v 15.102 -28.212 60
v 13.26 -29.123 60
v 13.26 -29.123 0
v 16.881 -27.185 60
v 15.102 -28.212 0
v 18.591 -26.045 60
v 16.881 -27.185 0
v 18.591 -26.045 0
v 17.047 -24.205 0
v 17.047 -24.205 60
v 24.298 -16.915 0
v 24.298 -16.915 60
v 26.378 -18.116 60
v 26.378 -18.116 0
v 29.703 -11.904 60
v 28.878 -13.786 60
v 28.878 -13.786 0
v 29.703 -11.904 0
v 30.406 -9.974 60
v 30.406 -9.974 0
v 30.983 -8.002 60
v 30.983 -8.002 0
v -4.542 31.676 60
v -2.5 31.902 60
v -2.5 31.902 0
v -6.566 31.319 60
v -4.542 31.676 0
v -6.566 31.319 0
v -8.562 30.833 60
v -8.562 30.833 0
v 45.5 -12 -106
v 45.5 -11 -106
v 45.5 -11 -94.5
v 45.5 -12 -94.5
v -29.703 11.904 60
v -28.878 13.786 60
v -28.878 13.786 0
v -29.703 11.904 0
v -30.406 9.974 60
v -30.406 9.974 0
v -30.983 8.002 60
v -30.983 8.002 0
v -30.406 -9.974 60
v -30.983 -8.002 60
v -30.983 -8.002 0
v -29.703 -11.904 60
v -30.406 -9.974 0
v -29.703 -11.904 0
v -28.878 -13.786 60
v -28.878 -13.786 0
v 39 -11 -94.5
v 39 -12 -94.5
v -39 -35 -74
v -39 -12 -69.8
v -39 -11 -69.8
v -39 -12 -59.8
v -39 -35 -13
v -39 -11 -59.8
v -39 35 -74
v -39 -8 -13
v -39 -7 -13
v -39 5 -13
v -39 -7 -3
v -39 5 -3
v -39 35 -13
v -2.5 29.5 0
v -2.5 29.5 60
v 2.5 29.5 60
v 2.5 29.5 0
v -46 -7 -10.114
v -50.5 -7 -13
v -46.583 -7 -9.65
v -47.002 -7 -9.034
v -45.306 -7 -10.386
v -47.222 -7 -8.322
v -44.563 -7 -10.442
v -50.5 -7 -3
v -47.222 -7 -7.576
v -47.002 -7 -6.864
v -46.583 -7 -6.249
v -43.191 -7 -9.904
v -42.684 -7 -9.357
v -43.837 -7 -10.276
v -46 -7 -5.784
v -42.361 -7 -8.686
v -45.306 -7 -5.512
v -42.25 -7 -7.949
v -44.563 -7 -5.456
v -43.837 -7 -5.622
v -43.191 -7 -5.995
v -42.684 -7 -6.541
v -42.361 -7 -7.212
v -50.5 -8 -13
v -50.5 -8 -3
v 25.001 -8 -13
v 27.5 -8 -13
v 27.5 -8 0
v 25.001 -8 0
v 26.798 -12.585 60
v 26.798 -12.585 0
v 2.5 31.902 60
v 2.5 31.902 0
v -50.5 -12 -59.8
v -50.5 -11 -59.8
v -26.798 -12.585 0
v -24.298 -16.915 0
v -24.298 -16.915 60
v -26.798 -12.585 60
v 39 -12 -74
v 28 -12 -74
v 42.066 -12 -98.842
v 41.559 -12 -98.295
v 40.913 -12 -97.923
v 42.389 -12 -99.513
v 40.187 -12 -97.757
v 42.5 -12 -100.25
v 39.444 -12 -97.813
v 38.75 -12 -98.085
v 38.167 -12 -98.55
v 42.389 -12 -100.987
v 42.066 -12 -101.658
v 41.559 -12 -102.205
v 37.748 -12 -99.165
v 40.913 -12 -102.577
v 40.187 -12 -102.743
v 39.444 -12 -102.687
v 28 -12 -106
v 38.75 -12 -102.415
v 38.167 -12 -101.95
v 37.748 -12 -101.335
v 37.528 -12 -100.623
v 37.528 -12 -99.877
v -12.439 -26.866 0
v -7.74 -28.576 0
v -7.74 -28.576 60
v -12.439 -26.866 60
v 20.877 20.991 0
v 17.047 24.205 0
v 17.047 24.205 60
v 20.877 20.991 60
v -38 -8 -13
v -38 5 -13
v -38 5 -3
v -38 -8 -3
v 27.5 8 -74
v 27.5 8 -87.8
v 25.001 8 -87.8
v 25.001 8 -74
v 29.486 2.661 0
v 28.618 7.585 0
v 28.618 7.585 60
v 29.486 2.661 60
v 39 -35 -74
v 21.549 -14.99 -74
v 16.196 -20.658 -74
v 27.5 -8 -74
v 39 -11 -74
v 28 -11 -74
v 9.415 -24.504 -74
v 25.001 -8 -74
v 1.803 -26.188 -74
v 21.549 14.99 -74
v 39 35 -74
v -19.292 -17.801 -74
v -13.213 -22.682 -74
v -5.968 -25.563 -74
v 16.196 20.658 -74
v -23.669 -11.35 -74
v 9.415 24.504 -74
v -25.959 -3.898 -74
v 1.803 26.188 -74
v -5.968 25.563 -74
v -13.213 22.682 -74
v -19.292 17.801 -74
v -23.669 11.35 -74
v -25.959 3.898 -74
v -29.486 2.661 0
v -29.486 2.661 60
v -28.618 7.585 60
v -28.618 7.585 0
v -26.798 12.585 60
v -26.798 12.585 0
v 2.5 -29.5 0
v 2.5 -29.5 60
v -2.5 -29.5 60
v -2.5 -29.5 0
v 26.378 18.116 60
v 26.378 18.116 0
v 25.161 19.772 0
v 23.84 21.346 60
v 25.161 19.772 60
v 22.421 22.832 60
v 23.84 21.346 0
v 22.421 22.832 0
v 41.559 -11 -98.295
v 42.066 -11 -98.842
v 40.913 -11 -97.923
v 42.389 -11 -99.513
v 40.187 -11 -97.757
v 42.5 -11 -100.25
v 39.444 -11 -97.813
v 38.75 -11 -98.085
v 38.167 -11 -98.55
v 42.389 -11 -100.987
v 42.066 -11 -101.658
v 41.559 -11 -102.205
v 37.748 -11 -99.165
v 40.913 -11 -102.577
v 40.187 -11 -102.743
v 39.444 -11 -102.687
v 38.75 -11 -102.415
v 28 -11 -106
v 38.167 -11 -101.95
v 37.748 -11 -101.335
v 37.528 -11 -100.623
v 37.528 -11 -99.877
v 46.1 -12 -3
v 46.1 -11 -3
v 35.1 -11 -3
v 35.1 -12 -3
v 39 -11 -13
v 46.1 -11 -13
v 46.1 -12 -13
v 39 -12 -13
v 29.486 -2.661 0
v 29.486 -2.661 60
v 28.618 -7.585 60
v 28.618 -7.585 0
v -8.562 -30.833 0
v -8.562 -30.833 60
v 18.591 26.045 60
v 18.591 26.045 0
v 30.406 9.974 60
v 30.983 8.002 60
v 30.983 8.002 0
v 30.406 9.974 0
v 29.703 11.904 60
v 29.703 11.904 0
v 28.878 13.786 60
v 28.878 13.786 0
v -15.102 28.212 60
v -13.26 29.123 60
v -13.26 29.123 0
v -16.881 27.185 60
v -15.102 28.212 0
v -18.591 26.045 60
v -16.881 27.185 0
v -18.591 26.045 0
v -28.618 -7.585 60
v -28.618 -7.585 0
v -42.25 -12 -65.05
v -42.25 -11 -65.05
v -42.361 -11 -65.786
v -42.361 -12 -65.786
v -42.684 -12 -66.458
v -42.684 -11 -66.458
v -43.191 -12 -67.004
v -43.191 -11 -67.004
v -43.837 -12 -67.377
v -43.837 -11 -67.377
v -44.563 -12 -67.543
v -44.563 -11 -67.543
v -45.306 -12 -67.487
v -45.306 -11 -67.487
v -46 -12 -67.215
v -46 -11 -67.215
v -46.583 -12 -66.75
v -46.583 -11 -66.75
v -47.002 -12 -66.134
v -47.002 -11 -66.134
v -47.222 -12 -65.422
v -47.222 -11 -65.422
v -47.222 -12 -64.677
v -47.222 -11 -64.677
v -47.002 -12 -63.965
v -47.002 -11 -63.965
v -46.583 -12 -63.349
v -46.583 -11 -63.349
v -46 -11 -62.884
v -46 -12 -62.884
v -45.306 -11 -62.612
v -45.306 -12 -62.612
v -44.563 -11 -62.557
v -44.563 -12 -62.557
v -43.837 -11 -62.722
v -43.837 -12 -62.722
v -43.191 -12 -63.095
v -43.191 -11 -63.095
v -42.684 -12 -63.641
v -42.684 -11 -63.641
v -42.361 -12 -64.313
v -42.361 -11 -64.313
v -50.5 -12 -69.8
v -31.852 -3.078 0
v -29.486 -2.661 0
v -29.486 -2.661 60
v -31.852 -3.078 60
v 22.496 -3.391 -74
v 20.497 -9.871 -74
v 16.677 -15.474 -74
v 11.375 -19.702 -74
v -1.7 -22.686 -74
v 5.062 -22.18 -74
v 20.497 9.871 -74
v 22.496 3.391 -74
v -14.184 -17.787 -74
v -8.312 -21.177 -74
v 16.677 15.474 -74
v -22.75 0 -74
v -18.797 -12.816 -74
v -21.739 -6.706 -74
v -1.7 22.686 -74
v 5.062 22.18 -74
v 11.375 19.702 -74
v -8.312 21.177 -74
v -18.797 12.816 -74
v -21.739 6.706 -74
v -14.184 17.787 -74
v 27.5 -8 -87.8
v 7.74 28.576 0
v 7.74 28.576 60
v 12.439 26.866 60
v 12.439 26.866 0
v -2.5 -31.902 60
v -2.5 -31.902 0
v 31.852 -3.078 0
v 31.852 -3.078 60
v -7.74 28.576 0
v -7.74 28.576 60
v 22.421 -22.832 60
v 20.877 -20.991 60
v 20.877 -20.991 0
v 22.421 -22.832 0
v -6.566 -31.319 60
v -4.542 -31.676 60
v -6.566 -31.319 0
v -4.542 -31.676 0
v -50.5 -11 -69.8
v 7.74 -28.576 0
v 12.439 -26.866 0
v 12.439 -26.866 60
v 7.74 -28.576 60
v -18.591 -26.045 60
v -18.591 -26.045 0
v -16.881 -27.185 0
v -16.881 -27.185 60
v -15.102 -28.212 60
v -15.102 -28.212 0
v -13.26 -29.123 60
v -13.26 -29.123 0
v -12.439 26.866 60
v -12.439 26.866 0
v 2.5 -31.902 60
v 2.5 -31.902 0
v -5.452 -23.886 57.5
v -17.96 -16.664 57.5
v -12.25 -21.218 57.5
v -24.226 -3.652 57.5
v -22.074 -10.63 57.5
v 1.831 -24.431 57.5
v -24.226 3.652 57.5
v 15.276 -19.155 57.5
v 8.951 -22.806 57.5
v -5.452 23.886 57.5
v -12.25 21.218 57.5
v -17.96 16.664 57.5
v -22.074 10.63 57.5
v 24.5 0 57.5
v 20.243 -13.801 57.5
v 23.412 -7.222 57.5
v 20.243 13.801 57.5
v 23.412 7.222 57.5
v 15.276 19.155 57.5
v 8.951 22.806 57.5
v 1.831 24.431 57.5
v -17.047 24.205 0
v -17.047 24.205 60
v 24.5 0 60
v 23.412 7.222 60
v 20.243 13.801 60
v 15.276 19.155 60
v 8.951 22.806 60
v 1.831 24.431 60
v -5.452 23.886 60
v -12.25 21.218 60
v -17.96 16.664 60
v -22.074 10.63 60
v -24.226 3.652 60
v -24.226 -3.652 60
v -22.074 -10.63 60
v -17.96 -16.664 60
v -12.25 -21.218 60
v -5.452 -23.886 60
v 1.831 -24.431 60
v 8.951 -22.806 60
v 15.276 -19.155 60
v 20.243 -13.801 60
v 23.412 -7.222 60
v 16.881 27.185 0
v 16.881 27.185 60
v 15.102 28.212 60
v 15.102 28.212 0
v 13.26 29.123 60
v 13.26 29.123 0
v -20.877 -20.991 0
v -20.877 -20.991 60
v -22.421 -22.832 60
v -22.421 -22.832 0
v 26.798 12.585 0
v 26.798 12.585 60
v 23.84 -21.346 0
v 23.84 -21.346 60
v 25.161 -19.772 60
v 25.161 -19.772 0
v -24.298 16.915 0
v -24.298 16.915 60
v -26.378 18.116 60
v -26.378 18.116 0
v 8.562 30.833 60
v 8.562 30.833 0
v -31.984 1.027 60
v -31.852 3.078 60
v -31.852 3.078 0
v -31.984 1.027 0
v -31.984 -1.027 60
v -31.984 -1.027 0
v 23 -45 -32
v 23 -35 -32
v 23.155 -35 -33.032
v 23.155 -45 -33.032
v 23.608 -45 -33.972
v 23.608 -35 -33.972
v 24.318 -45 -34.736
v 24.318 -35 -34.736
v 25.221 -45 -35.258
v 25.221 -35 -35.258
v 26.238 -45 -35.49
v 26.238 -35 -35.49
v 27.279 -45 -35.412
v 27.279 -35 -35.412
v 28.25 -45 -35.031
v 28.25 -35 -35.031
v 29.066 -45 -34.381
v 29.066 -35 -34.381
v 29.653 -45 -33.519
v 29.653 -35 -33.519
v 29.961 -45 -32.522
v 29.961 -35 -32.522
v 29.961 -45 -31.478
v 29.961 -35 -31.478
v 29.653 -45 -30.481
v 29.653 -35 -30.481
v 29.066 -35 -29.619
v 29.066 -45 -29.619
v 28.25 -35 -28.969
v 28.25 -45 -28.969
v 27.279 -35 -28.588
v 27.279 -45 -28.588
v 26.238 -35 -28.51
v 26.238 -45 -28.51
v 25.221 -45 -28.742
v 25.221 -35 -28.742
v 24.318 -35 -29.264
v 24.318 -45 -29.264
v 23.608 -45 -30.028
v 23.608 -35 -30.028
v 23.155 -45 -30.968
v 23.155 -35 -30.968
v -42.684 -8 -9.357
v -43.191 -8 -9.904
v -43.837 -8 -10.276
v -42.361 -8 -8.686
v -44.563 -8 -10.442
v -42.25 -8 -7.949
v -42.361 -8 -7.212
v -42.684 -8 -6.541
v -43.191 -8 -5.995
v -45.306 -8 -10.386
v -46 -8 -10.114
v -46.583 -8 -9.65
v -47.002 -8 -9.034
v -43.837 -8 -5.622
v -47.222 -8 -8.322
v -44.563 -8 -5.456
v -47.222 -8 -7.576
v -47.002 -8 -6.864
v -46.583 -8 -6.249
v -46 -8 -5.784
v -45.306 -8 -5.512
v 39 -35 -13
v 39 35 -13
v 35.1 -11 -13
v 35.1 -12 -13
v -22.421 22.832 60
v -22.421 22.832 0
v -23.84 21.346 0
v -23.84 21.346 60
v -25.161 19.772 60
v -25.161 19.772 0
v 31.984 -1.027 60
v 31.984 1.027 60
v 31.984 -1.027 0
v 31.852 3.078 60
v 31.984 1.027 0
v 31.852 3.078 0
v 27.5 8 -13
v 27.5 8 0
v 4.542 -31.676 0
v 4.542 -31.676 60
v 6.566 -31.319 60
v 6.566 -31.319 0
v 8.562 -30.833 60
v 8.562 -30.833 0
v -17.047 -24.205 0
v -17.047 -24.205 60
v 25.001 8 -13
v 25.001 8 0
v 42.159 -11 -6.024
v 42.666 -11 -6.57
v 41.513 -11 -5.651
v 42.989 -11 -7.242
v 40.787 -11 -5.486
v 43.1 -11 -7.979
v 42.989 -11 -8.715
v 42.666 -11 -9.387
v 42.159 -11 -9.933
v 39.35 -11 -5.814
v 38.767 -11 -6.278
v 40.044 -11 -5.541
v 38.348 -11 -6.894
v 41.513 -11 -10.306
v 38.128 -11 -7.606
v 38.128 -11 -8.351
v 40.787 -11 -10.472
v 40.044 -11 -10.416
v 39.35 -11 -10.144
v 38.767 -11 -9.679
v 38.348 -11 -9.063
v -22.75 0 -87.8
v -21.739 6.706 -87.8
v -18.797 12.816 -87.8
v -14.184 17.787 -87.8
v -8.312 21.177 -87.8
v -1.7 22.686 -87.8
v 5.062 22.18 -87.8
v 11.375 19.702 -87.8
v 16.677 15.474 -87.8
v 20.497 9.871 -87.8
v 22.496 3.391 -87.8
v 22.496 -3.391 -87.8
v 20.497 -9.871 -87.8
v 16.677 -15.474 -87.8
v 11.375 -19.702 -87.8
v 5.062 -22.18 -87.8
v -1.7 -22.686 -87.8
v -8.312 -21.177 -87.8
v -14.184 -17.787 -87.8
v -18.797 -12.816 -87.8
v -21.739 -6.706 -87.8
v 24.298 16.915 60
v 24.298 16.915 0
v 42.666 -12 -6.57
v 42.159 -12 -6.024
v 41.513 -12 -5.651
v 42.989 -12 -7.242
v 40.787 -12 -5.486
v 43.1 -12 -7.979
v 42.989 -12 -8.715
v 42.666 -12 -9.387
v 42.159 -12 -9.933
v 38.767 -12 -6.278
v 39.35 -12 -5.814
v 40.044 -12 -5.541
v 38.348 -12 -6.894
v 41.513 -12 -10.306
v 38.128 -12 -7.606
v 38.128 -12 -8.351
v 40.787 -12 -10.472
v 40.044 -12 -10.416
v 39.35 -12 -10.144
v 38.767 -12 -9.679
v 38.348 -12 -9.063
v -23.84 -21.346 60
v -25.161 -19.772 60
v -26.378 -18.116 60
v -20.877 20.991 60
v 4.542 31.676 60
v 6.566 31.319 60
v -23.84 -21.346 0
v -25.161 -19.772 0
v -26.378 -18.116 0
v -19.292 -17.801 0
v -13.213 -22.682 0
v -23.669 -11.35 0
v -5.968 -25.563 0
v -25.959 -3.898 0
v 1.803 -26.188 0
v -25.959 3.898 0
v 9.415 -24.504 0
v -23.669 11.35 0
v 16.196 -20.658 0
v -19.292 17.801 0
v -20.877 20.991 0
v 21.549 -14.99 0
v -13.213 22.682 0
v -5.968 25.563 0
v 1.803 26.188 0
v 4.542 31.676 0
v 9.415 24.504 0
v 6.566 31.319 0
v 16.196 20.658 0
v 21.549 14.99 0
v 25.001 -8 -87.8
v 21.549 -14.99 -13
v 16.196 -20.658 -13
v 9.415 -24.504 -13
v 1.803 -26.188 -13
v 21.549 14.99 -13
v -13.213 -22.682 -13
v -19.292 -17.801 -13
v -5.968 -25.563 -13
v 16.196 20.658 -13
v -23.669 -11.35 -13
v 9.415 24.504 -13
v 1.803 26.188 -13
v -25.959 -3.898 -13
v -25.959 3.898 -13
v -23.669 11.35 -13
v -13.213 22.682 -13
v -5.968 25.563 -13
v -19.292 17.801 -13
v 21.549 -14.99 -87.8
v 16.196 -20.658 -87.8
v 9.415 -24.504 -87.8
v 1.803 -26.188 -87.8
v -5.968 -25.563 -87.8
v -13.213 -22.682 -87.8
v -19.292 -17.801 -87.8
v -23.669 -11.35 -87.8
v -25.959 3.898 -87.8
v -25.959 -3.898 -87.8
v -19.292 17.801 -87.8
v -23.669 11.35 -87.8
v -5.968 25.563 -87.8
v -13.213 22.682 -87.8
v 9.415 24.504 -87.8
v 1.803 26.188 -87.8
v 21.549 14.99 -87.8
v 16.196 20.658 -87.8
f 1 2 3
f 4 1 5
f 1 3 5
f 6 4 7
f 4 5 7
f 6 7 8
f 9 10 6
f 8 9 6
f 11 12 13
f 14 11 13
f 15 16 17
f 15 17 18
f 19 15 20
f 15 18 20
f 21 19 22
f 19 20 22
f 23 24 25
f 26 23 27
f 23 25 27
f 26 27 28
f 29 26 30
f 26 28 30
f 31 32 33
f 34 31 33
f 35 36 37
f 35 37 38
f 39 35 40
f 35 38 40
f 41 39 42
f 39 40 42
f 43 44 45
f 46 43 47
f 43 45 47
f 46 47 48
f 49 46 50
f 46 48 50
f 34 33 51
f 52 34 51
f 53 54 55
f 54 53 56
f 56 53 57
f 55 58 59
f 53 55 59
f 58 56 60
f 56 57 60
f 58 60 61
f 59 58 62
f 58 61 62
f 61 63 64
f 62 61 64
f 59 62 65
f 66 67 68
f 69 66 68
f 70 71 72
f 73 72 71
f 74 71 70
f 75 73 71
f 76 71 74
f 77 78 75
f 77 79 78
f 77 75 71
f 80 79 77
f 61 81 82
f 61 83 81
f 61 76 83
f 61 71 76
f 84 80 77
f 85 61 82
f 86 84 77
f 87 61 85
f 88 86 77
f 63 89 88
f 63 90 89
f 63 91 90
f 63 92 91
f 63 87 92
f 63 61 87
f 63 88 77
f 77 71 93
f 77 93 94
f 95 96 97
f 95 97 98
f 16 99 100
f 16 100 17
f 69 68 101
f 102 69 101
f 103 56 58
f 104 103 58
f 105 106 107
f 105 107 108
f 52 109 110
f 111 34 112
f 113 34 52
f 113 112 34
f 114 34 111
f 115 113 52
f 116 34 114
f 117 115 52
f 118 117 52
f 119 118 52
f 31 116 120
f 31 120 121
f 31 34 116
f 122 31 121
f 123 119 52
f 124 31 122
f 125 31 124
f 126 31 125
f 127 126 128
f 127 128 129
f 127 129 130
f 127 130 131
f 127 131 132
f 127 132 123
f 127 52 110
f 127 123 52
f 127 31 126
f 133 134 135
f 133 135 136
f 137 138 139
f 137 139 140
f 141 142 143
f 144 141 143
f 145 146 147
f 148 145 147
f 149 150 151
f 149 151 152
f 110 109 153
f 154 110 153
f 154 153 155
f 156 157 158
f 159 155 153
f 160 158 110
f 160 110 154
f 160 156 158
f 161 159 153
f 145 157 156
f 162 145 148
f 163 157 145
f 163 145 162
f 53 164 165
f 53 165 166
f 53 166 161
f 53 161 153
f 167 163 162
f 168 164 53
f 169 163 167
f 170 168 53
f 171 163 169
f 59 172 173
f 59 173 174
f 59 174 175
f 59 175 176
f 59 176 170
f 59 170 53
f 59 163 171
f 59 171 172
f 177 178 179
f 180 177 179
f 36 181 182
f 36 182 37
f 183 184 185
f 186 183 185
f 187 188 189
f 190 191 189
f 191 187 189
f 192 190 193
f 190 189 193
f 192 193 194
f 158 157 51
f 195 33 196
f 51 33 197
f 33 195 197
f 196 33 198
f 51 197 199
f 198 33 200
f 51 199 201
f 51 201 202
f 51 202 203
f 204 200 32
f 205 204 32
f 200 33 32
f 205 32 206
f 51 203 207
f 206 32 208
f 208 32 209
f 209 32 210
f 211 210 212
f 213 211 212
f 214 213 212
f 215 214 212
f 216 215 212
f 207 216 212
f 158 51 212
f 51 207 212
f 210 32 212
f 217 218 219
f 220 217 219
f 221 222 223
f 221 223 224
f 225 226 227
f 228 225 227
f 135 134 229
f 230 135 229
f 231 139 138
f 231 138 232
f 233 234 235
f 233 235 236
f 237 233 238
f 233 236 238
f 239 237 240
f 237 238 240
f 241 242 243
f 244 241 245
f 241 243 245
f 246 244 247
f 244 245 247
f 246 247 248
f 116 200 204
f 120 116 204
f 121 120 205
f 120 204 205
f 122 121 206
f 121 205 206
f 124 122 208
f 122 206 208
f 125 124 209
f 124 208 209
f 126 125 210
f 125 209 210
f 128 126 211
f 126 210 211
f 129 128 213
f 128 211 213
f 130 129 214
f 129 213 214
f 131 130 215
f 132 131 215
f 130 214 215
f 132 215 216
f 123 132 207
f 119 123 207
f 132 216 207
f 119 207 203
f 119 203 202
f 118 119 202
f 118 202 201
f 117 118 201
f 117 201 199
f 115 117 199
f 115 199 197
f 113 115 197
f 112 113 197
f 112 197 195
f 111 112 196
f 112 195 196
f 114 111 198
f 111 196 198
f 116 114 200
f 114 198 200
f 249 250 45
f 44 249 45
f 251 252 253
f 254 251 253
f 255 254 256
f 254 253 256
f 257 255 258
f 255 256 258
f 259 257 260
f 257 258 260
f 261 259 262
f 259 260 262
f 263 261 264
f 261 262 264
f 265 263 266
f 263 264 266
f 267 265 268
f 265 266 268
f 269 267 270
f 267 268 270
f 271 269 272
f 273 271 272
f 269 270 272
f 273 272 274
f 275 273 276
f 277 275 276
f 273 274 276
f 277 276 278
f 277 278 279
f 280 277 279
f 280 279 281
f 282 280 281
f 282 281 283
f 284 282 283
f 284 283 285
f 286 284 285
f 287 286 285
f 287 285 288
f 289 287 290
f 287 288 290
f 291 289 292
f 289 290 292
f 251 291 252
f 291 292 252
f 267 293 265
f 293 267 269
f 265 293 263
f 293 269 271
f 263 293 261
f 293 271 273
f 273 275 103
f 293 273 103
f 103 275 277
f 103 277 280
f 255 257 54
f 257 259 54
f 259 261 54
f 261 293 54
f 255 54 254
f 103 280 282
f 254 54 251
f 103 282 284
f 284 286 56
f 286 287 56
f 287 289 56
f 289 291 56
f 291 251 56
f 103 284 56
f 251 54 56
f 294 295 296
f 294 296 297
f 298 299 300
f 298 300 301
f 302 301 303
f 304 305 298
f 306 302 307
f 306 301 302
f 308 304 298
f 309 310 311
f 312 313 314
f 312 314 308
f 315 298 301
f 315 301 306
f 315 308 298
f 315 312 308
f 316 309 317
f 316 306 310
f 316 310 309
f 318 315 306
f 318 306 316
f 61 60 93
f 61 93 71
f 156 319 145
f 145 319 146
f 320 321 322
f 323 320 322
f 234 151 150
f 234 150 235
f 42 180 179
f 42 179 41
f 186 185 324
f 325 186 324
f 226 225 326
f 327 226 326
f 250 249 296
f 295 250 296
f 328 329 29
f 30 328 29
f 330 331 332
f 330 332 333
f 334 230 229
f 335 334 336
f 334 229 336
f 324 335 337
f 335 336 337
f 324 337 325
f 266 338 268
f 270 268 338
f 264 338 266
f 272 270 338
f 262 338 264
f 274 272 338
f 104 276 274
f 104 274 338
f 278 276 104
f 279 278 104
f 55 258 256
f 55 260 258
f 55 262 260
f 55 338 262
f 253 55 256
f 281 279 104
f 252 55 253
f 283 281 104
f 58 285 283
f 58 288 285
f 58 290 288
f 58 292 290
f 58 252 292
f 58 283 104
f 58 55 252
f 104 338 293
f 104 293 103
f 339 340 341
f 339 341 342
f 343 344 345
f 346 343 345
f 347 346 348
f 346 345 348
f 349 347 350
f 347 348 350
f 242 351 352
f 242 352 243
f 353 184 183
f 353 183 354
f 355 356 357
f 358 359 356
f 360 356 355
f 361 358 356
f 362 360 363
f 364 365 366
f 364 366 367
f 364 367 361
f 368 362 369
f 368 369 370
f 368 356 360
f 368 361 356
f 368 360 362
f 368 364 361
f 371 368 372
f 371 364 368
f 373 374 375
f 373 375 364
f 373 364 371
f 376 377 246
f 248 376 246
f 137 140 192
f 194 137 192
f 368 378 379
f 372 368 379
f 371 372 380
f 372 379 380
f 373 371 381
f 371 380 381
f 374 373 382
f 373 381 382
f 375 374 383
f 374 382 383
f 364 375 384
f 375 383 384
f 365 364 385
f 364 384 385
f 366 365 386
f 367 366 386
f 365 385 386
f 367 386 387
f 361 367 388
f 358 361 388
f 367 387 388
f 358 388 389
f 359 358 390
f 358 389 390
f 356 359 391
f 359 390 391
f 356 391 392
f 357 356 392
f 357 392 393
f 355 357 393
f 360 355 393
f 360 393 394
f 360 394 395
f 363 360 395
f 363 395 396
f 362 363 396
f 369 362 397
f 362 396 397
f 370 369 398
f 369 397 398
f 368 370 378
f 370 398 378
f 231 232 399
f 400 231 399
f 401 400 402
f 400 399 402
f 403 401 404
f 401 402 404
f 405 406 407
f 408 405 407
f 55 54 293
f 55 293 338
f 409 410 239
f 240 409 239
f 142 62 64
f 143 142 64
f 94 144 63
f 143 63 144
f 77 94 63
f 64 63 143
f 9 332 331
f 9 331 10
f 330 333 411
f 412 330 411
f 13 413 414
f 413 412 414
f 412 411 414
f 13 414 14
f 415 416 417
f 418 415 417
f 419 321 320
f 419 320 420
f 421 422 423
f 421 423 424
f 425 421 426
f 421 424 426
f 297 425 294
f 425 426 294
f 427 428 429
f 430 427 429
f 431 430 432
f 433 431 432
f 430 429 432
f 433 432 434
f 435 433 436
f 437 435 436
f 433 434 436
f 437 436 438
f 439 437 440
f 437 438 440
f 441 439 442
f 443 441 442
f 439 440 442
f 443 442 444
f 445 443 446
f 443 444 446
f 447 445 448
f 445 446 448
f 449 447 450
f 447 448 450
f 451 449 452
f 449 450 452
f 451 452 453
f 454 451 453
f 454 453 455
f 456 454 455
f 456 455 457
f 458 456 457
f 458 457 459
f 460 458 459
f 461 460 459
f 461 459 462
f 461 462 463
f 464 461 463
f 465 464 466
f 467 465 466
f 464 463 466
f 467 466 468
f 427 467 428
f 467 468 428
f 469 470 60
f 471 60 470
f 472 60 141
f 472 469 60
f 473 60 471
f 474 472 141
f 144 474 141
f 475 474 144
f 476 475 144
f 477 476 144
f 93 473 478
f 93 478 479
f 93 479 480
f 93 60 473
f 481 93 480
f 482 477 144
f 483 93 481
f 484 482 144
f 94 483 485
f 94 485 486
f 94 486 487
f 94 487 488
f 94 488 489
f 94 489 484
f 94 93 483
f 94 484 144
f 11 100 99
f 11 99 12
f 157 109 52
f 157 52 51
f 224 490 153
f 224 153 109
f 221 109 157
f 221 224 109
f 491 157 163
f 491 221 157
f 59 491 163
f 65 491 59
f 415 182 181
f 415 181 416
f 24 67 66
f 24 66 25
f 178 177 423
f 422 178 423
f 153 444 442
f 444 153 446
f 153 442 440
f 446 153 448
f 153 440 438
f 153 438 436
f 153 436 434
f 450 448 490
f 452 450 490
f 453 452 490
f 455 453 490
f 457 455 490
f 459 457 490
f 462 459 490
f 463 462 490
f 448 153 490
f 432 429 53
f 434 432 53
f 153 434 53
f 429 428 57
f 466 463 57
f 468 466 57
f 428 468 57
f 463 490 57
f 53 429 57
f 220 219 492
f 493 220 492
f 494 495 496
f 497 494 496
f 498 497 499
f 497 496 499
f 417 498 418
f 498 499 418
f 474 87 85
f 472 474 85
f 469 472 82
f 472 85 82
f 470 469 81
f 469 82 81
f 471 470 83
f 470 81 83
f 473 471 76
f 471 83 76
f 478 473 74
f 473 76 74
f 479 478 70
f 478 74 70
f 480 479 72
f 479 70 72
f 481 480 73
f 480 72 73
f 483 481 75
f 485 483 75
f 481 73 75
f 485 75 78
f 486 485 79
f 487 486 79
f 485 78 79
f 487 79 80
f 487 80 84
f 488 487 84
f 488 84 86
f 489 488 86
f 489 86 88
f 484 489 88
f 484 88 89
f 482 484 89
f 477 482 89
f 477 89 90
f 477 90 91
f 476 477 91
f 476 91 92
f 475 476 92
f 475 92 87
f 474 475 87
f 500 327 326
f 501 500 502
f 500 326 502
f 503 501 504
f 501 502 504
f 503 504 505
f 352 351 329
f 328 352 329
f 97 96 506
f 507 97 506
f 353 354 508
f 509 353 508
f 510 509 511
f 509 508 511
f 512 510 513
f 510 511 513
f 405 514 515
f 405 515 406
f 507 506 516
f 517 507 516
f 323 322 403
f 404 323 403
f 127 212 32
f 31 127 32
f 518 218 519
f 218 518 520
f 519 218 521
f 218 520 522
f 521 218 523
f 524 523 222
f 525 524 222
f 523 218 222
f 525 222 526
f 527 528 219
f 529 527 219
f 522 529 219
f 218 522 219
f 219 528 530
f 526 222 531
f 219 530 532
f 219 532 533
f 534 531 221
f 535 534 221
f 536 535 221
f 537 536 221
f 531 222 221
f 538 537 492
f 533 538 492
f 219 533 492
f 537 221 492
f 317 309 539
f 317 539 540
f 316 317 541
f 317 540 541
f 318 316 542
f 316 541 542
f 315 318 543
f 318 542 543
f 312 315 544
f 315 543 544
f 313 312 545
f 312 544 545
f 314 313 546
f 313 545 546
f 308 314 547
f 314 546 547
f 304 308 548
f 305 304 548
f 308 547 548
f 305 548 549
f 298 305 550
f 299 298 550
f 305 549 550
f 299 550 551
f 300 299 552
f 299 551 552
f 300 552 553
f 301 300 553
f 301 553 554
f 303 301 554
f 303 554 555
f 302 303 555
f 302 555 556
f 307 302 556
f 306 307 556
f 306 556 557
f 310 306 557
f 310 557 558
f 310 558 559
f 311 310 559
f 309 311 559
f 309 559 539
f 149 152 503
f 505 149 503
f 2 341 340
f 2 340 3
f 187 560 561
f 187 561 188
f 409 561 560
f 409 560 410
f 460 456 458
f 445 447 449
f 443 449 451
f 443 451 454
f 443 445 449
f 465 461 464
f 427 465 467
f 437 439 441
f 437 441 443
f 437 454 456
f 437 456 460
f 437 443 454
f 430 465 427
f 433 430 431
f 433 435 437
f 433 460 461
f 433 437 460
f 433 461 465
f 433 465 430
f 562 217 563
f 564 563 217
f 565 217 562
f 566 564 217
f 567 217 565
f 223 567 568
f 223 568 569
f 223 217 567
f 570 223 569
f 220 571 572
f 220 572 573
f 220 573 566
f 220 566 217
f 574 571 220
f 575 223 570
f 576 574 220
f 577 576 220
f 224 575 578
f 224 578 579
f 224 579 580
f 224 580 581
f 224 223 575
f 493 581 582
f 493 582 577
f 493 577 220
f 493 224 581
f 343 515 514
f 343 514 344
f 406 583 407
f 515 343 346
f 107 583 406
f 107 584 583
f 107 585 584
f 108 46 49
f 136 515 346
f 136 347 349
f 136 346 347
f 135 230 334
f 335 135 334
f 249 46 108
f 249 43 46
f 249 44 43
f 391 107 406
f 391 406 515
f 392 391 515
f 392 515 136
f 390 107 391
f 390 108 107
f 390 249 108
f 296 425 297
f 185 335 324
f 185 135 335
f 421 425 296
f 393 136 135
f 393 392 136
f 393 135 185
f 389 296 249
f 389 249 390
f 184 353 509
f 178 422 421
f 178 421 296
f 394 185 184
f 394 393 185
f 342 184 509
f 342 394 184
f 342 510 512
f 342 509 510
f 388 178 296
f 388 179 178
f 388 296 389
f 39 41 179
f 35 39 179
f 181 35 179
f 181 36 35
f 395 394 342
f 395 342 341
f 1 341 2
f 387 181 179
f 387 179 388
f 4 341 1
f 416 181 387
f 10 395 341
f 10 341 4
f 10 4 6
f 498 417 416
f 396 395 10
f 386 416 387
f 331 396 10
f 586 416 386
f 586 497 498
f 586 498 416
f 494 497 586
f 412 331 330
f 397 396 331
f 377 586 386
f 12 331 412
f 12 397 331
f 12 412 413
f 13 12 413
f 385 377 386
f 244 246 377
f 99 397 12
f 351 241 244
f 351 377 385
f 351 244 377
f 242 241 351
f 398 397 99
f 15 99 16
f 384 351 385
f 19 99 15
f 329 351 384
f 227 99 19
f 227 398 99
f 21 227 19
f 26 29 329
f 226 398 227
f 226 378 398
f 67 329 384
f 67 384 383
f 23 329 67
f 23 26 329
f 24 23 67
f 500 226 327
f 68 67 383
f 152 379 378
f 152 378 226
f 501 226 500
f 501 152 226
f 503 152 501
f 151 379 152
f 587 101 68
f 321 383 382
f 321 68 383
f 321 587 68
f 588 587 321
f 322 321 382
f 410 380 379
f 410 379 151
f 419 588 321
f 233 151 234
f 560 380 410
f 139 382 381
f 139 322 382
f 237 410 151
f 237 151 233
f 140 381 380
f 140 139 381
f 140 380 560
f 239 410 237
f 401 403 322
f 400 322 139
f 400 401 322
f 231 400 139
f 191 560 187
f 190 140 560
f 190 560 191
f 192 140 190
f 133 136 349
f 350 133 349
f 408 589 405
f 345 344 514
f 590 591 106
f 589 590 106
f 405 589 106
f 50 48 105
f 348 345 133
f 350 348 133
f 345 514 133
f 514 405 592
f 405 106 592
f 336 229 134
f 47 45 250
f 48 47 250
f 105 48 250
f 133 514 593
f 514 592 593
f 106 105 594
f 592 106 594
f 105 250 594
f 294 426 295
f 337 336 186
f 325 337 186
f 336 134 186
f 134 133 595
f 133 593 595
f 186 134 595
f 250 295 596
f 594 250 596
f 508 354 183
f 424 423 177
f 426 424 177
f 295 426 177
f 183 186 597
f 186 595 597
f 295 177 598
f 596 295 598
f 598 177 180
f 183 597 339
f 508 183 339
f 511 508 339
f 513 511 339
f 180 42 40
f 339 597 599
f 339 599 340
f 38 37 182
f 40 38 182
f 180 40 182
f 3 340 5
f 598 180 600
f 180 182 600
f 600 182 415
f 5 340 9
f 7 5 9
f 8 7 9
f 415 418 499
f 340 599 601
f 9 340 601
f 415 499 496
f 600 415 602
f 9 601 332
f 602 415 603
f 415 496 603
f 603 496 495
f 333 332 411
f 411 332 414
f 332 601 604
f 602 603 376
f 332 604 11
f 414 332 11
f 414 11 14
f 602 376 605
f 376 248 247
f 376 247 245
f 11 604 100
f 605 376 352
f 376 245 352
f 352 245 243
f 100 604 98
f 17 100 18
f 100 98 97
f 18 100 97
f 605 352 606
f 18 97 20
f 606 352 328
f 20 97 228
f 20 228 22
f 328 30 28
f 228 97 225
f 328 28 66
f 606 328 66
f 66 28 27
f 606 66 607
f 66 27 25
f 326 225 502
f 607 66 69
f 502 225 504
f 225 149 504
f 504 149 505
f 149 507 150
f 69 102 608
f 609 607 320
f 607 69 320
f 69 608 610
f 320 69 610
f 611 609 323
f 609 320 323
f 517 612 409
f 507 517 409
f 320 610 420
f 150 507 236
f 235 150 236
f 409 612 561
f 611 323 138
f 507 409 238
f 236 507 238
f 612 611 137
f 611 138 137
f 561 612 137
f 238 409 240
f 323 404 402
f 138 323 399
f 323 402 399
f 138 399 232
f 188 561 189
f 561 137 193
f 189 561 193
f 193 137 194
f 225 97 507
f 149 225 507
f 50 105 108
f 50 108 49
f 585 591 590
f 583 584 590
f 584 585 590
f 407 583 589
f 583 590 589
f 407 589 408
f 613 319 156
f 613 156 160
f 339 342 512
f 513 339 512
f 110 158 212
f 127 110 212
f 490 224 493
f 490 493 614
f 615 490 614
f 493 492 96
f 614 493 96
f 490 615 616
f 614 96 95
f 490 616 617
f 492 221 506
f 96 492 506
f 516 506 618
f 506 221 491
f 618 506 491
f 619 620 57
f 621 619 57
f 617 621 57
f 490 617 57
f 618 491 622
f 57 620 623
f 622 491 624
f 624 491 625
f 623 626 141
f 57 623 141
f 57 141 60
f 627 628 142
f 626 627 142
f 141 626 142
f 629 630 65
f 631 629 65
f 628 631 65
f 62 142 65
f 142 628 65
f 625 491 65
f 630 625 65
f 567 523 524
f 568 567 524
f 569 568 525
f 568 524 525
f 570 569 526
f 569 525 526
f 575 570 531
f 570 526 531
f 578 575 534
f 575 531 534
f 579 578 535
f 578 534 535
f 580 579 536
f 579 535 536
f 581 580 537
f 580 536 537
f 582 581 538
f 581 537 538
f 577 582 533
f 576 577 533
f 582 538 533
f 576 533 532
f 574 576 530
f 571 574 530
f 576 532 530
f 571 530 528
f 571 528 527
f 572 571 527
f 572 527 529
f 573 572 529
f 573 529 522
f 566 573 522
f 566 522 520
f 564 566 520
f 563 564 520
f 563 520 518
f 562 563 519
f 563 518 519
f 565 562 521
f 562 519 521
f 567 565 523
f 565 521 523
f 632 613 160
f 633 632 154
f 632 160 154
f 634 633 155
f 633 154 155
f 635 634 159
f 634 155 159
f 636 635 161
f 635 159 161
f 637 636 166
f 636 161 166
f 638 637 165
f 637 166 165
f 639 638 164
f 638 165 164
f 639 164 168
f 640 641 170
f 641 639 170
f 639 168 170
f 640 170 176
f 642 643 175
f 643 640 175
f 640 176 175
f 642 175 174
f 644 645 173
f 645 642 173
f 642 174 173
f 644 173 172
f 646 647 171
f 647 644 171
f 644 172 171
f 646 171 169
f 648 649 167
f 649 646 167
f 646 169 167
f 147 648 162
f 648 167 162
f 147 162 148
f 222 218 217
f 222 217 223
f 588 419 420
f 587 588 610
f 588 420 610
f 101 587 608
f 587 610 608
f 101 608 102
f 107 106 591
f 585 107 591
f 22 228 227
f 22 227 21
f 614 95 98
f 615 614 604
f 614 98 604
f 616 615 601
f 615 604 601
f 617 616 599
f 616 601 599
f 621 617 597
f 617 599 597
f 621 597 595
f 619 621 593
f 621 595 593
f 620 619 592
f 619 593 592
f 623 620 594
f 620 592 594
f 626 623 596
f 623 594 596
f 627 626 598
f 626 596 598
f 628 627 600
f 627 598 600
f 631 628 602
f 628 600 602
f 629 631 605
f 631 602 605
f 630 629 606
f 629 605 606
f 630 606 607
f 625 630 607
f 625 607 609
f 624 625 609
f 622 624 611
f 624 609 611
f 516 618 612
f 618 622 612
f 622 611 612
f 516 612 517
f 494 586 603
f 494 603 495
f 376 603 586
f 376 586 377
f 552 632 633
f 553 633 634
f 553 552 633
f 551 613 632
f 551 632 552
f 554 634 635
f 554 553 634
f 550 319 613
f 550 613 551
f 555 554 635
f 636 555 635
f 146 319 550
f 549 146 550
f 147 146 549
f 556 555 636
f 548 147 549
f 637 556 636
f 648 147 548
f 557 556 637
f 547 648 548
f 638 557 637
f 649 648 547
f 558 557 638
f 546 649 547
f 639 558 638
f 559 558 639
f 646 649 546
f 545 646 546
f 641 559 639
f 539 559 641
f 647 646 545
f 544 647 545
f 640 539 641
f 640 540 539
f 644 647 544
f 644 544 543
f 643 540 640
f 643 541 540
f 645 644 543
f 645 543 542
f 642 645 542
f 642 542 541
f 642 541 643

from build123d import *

# Parameters (mm, degrees)
CROQUIS1_R              = 32
SALIENTE_EXTRUIR1_DEPTH = 60
CROQUIS2_R              = 24.5
CORTAR_EXTRUIR1_DEPTH   = 2.5
CROQUIS3_W              = 5
CROQUIS3_H              = 5
CORTAR_EXTRUIR2_DEPTH   = 61
MATRIZC1_COUNT          = 18
CROQUIS4_R              = 26.25
SALIENTE_EXTRUIR2_DEPTH = 87.8
CROQUIS5_R              = 22.75
CORTAR_EXTRUIR3_DEPTH   = 37
SALIENTE_EXTRUIR3_REACH = 149.8
CROQUIS6_W              = 2.5
CROQUIS6_H              = 16
CROQUIS7_W              = 78
CROQUIS7_H              = 70
SALIENTE_EXTRUIR4_DEPTH = 61
CROQUIS8_W              = 10
CROQUIS8_H              = 1
SALIENTE_EXTRUIR5_DEPTH = 11.5
CROQUIS9_W              = 10
CROQUIS9_H              = 13
SALIENTE_EXTRUIR6_DEPTH = 1
CROQUIS10_W             = 11
CROQUIS10_H             = 10
SALIENTE_EXTRUIR7_DEPTH = 1
SALIENTE_EXTRUIR8_DEPTH = 1
CROQUIS12_R             = 2.5
CORTAR_EXTRUIR4_DEPTH   = 29
CROQUIS13_R             = 2.5
CORTAR_EXTRUIR5_DEPTH   = 1
CROQUIS14_R             = 2.5
CORTAR_EXTRUIR6_DEPTH   = 1
CROQUIS15_R             = 2.5
CORTAR_EXTRUIR7_DEPTH   = 1
CROQUIS16_R             = 3.5
SALIENTE_EXTRUIR9_DEPTH = 10


with BuildPart() as part:
    # Croquis1 → Saliente-Extruir1 (new body)
    with BuildSketch(Plane.XY):
        Circle(CROQUIS1_R)
    extrude(amount=SALIENTE_EXTRUIR1_DEPTH)

    # Croquis2 → Cortar-Extruir1 (cut)
    with BuildSketch(Plane.XY.offset(60)):
        Circle(CROQUIS2_R)
    extrude(amount=-CORTAR_EXTRUIR1_DEPTH, mode=Mode.SUBTRACT)

    # Croquis3 → Cortar-Extruir2 (cut, through all)
    with BuildSketch(Plane.XY.offset(60)):
        with Locations((0, 32)):
            Rectangle(CROQUIS3_W, CROQUIS3_H)
    cortar_extruir2 = extrude(amount=-CORTAR_EXTRUIR2_DEPTH, mode=Mode.SUBTRACT)

    # MatrizC1: Cortar-Extruir2 ×18 about axis
    matrizc1_axis = Axis((0, 0, 0), (0, 0, 1))
    for i in range(1, MATRIZC1_COUNT):
        add(cortar_extruir2.rotate(matrizc1_axis, i * 360 / MATRIZC1_COUNT), mode=Mode.SUBTRACT)

    # Croquis4 → Saliente-Extruir2 (add)
    with BuildSketch(Plane(origin=(0, 0, 0), x_dir=(-1, 0, 0), z_dir=(0, 0, -1))):
        Circle(CROQUIS4_R)
    extrude(amount=SALIENTE_EXTRUIR2_DEPTH)

    # Croquis5 → Cortar-Extruir3 (cut)
    with BuildSketch(Plane(origin=(0, 0, -87.8), x_dir=(-1, 0, 0), z_dir=(0, 0, -1))):
        Circle(CROQUIS5_R)
    extrude(amount=-CORTAR_EXTRUIR3_DEPTH, mode=Mode.SUBTRACT)

    # Croquis6 → Saliente-Extruir3 (add, up to next)
    with BuildSketch(Plane(origin=(0, 0, -87.8), x_dir=(-1, 0, 0), z_dir=(0, 0, -1)), mode=Mode.PRIVATE) as saliente_extruir3_sk1:
        with Locations((-26.25, 0)):
            Rectangle(CROQUIS6_W, CROQUIS6_H)
    saliente_extruir3_tool1 = extrude(saliente_extruir3_sk1.sketch, amount=-SALIENTE_EXTRUIR3_REACH, mode=Mode.PRIVATE) - part.part
    add(saliente_extruir3_tool1.solids().sort_by_distance((26.25, 0, -87.8))[0])

    # Croquis7 → Saliente-Extruir4 (add)
    with BuildSketch(Plane(origin=(0, 0, -13), x_dir=(-1, 0, 0), z_dir=(0, 0, -1))):
        Rectangle(CROQUIS7_W, CROQUIS7_H)
    extrude(amount=SALIENTE_EXTRUIR4_DEPTH)

    # Croquis8 → Saliente-Extruir5 (add)
    with BuildSketch(Plane.ZY.offset(39)):
        with Locations((-64.8, -11.5)):
            Rectangle(CROQUIS8_W, CROQUIS8_H)
        with Locations((-8, -7.5)):
            Rectangle(CROQUIS8_W, CROQUIS8_H)
    extrude(amount=SALIENTE_EXTRUIR5_DEPTH)

    # Croquis9 → Saliente-Extruir6 (add)
    with BuildSketch(Plane.ZY.offset(39)):
        with Locations((-8, -1.5)):
            Rectangle(CROQUIS9_W, CROQUIS9_H)
    extrude(amount=-SALIENTE_EXTRUIR6_DEPTH)

    # Croquis10 → Saliente-Extruir7 (add)
    with BuildSketch(Plane(origin=(0, -11, 0), x_dir=(-1, 0, 0), z_dir=(0, -1, 0))):
        with Locations((-40.6, 8)):
            Rectangle(CROQUIS10_W, CROQUIS10_H)
    extrude(amount=SALIENTE_EXTRUIR7_DEPTH)

    # Croquis11 → Saliente-Extruir8 (add)
    with BuildSketch(Plane(origin=(0, -11, 0), x_dir=(-1, 0, 0), z_dir=(0, -1, 0))):
        Polygon((-39, 74), (-28, 74), (-28, 106), (-45.5, 106), (-45.5, 94.5), (-39, 94.5), align=None)
    extrude(amount=SALIENTE_EXTRUIR8_DEPTH)

    # Croquis12 → Cortar-Extruir4 (cut, through all)
    with BuildSketch(Plane(origin=(0, -7, 0), x_dir=(1, 0, 0), z_dir=(0, 1, 0))):
        with Locations((-44.75, 7.949105166)):
            Circle(CROQUIS12_R)
    extrude(amount=-CORTAR_EXTRUIR4_DEPTH, mode=Mode.SUBTRACT)

    # Croquis13 → Cortar-Extruir5 (cut)
    with BuildSketch(Plane(origin=(0, -11, 0), x_dir=(1, 0, 0), z_dir=(0, 1, 0))):
        with Locations((40.6, 7.978589127)):
            Circle(CROQUIS13_R)
    extrude(amount=-CORTAR_EXTRUIR5_DEPTH, mode=Mode.SUBTRACT)

    # Croquis14 → Cortar-Extruir6 (cut)
    with BuildSketch(Plane(origin=(0, -11, 0), x_dir=(1, 0, 0), z_dir=(0, 1, 0))):
        with Locations((-44.75, 65.049509944)):
            Circle(CROQUIS14_R)
    extrude(amount=-CORTAR_EXTRUIR6_DEPTH, mode=Mode.SUBTRACT)

    # Croquis15 → Cortar-Extruir7 (cut)
    with BuildSketch(Plane(origin=(0, -11, 0), x_dir=(1, 0, 0), z_dir=(0, 1, 0))):
        with Locations((40, 100.25)):
            Circle(CROQUIS15_R)
    extrude(amount=-CORTAR_EXTRUIR7_DEPTH, mode=Mode.SUBTRACT)

    # Croquis16 → Saliente-Extruir9 (add)
    with BuildSketch(Plane(origin=(0, -35, 0), x_dir=(-1, 0, 0), z_dir=(0, -1, 0))):
        with Locations((-26.5, 32)):
            Circle(CROQUIS16_R)
    extrude(amount=SALIENTE_EXTRUIR9_DEPTH)


solid = part.part
